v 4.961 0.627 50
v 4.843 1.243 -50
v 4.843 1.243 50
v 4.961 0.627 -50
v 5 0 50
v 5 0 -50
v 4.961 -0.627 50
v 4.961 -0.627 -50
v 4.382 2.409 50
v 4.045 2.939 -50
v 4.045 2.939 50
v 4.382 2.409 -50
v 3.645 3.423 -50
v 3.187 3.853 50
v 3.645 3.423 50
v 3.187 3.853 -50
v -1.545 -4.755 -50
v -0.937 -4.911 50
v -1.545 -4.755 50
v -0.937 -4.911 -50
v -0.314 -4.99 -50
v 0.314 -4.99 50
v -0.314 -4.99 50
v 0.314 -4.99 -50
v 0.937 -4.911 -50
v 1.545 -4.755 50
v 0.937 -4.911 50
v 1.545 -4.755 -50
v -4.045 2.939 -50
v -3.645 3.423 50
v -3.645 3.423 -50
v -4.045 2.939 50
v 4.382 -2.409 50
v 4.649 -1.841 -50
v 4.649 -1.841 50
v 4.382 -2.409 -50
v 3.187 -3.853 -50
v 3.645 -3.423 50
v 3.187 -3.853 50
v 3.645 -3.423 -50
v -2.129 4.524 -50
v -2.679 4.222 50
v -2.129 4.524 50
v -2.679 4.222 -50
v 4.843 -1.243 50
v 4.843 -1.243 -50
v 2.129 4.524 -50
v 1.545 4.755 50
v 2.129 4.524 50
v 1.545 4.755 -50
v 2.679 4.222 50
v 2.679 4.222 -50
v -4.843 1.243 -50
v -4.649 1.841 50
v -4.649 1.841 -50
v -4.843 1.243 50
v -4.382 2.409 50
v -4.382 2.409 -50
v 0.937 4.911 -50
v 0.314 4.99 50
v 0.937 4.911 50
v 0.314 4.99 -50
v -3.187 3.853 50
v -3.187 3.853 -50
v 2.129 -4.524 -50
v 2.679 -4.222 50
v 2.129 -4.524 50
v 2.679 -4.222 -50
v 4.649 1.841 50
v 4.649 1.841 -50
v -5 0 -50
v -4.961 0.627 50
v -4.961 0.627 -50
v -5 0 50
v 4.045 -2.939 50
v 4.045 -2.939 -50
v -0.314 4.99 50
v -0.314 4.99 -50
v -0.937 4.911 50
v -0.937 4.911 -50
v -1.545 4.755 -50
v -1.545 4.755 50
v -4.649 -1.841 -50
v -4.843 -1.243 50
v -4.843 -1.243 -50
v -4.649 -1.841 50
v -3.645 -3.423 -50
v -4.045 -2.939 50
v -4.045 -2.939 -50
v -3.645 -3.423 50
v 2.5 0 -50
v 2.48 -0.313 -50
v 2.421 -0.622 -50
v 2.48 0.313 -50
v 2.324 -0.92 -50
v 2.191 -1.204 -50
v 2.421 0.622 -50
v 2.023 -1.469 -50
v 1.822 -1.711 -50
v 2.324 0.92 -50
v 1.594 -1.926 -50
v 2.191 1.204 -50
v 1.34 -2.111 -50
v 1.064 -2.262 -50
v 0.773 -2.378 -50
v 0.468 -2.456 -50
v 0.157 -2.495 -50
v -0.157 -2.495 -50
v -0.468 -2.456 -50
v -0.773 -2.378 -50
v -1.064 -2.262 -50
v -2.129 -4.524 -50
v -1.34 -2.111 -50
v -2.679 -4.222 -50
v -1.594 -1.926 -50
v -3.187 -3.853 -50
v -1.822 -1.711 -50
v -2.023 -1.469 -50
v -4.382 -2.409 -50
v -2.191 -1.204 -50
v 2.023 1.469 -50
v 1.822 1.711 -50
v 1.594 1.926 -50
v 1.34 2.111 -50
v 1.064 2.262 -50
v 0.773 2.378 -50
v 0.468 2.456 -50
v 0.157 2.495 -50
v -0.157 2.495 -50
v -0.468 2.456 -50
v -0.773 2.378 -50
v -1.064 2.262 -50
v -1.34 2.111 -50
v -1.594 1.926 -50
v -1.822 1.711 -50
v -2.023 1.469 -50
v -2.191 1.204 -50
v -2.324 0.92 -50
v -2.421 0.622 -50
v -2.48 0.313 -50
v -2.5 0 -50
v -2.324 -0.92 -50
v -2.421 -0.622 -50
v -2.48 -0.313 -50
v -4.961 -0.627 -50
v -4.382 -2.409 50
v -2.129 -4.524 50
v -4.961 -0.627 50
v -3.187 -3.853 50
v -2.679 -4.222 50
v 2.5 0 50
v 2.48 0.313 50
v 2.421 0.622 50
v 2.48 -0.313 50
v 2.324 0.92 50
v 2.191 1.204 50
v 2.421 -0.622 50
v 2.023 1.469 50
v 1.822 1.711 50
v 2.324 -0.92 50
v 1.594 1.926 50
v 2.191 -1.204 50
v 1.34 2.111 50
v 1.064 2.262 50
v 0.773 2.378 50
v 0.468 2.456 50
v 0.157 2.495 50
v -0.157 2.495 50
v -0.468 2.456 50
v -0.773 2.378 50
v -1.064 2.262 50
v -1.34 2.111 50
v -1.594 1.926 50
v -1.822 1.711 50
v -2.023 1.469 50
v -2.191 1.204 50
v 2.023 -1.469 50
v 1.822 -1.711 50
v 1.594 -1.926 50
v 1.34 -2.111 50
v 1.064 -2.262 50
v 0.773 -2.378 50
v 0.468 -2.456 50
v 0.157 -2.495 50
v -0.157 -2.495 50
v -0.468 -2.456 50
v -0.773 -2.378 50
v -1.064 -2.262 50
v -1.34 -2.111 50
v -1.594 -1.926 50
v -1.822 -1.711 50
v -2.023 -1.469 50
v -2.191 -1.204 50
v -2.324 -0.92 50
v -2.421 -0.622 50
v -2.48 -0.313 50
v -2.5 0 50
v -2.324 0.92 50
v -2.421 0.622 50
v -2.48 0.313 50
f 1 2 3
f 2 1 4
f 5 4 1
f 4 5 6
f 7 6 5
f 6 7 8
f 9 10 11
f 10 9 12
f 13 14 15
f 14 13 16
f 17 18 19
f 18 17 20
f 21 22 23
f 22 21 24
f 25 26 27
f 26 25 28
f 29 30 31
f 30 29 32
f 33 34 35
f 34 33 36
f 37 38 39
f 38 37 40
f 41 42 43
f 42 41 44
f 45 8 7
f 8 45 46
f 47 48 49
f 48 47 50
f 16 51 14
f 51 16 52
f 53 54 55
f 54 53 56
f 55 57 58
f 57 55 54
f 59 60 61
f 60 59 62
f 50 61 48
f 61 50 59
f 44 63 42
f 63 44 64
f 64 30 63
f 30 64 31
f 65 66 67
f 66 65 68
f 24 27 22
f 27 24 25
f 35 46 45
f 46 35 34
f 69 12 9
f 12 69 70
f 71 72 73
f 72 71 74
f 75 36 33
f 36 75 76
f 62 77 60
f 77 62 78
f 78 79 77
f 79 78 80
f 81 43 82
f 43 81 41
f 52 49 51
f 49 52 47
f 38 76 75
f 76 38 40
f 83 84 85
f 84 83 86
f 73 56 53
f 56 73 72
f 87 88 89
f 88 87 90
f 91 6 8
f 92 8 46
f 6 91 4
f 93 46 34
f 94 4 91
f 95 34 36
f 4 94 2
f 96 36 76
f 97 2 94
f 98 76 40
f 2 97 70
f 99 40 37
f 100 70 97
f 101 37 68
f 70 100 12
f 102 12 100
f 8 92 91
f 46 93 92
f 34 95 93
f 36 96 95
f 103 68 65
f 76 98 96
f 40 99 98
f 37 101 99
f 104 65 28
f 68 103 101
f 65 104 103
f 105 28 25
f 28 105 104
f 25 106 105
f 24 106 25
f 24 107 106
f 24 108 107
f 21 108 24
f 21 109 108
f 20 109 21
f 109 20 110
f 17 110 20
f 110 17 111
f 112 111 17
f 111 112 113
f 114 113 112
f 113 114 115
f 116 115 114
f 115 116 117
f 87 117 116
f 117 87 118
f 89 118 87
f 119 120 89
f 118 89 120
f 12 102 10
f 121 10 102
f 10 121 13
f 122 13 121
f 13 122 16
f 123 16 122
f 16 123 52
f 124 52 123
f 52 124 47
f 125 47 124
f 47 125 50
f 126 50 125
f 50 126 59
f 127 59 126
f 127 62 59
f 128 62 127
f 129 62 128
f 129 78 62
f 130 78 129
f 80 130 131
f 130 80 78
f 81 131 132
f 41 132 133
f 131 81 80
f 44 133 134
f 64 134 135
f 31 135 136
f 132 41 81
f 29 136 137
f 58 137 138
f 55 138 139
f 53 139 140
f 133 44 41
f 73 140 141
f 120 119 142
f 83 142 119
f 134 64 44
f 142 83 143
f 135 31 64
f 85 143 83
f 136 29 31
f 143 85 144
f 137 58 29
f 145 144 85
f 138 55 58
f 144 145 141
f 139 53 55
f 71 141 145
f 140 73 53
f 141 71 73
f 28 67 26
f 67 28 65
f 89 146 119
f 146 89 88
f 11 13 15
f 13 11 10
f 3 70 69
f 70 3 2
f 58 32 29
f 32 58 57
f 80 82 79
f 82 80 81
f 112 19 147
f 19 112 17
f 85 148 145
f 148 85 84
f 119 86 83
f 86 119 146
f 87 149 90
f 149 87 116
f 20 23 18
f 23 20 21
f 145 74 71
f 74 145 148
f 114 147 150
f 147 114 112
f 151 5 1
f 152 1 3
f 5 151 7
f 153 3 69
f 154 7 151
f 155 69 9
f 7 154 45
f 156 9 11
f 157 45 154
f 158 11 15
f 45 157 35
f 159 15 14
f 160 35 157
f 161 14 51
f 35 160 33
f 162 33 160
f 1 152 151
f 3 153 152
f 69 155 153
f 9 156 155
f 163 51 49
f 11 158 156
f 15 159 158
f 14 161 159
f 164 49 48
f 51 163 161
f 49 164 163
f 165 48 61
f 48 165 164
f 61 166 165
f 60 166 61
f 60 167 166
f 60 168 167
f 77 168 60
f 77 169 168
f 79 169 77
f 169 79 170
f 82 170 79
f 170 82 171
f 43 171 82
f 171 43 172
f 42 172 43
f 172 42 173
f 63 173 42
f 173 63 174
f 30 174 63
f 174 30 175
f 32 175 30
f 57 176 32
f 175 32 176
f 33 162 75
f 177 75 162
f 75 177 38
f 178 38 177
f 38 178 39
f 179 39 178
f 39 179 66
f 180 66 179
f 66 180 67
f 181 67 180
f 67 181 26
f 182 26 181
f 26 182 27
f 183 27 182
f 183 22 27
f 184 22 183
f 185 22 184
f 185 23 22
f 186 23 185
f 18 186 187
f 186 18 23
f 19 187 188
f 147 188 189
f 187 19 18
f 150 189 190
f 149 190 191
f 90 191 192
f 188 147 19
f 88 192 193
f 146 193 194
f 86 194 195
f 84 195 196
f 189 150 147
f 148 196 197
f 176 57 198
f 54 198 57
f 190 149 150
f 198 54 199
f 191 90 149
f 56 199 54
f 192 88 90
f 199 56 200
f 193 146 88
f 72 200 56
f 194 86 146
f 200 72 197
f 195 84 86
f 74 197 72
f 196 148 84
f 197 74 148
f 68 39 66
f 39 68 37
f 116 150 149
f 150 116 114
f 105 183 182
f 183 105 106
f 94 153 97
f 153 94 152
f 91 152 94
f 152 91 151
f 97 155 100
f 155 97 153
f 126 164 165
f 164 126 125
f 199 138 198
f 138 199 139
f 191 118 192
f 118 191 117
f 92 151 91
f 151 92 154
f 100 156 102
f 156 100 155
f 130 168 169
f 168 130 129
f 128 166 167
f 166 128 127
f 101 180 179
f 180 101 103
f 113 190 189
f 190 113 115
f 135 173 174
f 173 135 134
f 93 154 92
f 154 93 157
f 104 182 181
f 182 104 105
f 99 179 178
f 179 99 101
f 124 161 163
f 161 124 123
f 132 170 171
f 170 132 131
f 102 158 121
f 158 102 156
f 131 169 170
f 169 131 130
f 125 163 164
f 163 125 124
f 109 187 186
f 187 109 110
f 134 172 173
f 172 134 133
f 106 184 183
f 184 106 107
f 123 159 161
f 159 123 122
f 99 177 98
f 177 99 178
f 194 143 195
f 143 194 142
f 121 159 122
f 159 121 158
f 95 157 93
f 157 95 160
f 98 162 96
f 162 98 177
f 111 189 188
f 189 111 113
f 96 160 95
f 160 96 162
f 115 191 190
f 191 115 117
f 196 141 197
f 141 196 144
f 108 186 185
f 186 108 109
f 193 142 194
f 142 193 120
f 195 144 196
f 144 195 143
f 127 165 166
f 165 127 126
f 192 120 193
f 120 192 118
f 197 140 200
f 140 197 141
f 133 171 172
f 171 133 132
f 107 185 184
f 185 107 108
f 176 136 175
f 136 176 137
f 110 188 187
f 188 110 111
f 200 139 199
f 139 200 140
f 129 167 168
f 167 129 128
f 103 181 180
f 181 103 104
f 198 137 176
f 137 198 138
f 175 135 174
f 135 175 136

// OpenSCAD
$fn = 50;


difference() {
	union() {
		translate(v = [0, 0, -50.0000000000]) {
			cylinder(h = 100, r = 5.0000000000);
		}
	}
	union() {
		translate(v = [0, 0, -100.0000000000]) {
			cylinder(h = 200, r = 2.5000000000);
		}
	}
}
